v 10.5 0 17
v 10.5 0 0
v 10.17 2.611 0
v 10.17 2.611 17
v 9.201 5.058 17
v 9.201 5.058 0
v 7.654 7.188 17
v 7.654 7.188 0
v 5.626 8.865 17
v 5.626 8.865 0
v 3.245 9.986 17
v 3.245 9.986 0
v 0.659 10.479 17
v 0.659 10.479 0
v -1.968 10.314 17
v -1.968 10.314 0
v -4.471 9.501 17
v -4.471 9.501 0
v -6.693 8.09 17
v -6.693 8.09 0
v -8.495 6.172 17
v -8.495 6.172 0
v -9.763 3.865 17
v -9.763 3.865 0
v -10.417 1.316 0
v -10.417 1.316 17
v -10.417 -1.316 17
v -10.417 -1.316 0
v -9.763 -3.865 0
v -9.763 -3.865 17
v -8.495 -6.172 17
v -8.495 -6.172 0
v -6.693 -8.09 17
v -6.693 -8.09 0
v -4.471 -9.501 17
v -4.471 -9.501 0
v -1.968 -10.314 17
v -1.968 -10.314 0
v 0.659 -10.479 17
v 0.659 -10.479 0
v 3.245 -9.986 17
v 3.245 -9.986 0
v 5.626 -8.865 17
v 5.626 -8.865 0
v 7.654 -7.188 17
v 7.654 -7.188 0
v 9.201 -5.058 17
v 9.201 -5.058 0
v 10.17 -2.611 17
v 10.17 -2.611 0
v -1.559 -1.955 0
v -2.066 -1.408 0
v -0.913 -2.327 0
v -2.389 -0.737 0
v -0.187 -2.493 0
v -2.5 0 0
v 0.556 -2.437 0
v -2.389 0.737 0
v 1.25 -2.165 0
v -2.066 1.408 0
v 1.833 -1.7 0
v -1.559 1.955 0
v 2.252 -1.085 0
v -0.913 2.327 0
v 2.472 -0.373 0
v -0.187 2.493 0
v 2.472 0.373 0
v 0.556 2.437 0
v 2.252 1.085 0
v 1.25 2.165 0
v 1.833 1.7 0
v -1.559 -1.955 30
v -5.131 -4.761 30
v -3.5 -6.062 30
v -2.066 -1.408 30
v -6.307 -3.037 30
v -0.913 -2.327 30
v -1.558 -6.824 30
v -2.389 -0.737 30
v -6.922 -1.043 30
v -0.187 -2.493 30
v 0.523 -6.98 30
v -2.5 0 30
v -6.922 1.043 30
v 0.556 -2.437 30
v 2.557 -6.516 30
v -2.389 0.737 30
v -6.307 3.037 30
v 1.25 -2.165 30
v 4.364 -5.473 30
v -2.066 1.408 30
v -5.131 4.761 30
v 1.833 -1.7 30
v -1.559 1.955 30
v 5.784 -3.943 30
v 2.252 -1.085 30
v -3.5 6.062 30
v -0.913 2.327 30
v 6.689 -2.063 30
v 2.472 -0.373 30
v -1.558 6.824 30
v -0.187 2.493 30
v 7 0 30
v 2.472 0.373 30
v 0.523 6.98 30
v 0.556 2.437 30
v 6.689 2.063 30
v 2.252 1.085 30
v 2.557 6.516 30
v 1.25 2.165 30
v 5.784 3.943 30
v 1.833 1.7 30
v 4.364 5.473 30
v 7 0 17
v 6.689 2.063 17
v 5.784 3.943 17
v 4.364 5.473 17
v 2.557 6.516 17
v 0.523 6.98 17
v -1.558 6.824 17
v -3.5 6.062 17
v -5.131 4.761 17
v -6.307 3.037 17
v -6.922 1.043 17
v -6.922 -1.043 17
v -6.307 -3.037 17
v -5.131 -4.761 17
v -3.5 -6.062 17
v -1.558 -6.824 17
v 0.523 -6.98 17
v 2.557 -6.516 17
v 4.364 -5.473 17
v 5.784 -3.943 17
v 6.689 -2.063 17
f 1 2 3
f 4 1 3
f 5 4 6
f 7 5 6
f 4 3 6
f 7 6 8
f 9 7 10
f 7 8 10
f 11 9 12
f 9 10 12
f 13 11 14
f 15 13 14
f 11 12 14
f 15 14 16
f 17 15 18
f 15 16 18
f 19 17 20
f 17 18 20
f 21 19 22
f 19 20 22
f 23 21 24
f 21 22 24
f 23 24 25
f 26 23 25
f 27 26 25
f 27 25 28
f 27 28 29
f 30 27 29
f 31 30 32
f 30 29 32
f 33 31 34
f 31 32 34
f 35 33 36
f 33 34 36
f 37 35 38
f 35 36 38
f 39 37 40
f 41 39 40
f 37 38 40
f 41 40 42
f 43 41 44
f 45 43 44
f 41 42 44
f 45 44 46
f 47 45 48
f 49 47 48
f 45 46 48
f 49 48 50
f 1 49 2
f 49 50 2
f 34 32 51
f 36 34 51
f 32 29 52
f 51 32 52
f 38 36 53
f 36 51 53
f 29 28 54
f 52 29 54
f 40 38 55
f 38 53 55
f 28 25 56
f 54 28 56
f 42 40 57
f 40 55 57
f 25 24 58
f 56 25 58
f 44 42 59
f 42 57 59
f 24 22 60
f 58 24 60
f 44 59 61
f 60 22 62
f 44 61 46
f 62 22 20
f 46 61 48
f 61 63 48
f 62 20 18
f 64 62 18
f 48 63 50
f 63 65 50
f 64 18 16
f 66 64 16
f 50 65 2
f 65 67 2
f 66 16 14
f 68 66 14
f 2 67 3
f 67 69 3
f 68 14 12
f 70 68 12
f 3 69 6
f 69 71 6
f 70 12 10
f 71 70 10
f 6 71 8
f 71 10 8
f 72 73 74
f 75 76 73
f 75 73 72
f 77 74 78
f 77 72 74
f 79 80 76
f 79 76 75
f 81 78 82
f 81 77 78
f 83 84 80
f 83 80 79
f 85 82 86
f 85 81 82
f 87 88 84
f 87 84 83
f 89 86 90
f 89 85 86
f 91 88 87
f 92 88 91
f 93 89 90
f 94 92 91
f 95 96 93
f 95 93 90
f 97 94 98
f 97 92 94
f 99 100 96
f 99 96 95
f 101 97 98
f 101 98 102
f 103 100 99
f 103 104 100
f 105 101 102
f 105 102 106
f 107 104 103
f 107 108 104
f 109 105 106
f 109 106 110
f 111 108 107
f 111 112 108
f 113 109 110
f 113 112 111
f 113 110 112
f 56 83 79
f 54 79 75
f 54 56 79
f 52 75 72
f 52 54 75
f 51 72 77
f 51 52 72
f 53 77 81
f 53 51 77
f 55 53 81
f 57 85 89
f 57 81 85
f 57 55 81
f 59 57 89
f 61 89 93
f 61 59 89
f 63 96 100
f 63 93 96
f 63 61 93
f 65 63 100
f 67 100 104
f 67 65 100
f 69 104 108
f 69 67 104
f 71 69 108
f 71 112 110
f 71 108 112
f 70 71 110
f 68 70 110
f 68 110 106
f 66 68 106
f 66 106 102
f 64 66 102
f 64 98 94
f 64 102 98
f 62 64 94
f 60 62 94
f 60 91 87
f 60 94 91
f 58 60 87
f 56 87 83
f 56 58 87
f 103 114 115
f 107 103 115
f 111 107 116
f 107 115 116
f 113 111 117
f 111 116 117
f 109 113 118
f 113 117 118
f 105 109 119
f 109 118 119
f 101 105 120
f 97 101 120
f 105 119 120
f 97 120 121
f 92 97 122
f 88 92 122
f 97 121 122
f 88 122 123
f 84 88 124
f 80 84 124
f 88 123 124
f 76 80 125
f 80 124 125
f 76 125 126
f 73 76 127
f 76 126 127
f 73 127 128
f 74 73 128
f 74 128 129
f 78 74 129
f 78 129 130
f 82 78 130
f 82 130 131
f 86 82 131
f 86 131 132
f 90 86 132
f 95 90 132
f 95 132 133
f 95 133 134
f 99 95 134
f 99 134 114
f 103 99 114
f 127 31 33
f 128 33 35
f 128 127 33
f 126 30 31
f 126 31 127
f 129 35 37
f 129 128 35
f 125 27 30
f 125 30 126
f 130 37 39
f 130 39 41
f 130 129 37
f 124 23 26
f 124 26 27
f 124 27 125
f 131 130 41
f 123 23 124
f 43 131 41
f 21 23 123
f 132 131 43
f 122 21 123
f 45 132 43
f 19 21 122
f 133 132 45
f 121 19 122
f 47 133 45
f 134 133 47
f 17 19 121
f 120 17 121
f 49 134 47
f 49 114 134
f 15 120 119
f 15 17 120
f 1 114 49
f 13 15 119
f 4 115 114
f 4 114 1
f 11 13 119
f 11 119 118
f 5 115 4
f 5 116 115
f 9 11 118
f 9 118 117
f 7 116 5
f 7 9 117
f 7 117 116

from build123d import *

# Parameters (mm, degrees)
CROQUIS1_R              = 10.5
CROQUIS1_R_2            = 7
SALIENTE_EXTRUIR1_DEPTH = 17
CROQUIS2_R              = 7
SALIENTE_EXTRUIR2_DEPTH = 30
CROQUIS3_R              = 2.5
CORTAR_EXTRUIR1_DEPTH   = 58


with BuildPart() as part:
    # Croquis1 → Saliente-Extruir1 (new body)
    # profile 1 of 2: a face of its own
    with BuildSketch(Plane.XY):
        Circle(CROQUIS1_R)
        Circle(CROQUIS1_R_2, mode=Mode.SUBTRACT)
    # profile 2 of 2: a face of its own
    with BuildSketch(Plane.XY):
        Circle(CROQUIS1_R_2)
    extrude(amount=SALIENTE_EXTRUIR1_DEPTH)

    # Croquis2 → Saliente-Extruir2 (add)
    with BuildSketch(Plane.XY):
        Circle(CROQUIS2_R)
    extrude(amount=SALIENTE_EXTRUIR2_DEPTH)

    # Croquis3 → Cortar-Extruir1 (cut)
    with BuildSketch(Plane.XY):
        with Locations(Location((0, 0, 0), (0, 0, 180))):
            Circle(CROQUIS3_R)
    extrude(amount=CORTAR_EXTRUIR1_DEPTH, mode=Mode.SUBTRACT)


solid = part.part
